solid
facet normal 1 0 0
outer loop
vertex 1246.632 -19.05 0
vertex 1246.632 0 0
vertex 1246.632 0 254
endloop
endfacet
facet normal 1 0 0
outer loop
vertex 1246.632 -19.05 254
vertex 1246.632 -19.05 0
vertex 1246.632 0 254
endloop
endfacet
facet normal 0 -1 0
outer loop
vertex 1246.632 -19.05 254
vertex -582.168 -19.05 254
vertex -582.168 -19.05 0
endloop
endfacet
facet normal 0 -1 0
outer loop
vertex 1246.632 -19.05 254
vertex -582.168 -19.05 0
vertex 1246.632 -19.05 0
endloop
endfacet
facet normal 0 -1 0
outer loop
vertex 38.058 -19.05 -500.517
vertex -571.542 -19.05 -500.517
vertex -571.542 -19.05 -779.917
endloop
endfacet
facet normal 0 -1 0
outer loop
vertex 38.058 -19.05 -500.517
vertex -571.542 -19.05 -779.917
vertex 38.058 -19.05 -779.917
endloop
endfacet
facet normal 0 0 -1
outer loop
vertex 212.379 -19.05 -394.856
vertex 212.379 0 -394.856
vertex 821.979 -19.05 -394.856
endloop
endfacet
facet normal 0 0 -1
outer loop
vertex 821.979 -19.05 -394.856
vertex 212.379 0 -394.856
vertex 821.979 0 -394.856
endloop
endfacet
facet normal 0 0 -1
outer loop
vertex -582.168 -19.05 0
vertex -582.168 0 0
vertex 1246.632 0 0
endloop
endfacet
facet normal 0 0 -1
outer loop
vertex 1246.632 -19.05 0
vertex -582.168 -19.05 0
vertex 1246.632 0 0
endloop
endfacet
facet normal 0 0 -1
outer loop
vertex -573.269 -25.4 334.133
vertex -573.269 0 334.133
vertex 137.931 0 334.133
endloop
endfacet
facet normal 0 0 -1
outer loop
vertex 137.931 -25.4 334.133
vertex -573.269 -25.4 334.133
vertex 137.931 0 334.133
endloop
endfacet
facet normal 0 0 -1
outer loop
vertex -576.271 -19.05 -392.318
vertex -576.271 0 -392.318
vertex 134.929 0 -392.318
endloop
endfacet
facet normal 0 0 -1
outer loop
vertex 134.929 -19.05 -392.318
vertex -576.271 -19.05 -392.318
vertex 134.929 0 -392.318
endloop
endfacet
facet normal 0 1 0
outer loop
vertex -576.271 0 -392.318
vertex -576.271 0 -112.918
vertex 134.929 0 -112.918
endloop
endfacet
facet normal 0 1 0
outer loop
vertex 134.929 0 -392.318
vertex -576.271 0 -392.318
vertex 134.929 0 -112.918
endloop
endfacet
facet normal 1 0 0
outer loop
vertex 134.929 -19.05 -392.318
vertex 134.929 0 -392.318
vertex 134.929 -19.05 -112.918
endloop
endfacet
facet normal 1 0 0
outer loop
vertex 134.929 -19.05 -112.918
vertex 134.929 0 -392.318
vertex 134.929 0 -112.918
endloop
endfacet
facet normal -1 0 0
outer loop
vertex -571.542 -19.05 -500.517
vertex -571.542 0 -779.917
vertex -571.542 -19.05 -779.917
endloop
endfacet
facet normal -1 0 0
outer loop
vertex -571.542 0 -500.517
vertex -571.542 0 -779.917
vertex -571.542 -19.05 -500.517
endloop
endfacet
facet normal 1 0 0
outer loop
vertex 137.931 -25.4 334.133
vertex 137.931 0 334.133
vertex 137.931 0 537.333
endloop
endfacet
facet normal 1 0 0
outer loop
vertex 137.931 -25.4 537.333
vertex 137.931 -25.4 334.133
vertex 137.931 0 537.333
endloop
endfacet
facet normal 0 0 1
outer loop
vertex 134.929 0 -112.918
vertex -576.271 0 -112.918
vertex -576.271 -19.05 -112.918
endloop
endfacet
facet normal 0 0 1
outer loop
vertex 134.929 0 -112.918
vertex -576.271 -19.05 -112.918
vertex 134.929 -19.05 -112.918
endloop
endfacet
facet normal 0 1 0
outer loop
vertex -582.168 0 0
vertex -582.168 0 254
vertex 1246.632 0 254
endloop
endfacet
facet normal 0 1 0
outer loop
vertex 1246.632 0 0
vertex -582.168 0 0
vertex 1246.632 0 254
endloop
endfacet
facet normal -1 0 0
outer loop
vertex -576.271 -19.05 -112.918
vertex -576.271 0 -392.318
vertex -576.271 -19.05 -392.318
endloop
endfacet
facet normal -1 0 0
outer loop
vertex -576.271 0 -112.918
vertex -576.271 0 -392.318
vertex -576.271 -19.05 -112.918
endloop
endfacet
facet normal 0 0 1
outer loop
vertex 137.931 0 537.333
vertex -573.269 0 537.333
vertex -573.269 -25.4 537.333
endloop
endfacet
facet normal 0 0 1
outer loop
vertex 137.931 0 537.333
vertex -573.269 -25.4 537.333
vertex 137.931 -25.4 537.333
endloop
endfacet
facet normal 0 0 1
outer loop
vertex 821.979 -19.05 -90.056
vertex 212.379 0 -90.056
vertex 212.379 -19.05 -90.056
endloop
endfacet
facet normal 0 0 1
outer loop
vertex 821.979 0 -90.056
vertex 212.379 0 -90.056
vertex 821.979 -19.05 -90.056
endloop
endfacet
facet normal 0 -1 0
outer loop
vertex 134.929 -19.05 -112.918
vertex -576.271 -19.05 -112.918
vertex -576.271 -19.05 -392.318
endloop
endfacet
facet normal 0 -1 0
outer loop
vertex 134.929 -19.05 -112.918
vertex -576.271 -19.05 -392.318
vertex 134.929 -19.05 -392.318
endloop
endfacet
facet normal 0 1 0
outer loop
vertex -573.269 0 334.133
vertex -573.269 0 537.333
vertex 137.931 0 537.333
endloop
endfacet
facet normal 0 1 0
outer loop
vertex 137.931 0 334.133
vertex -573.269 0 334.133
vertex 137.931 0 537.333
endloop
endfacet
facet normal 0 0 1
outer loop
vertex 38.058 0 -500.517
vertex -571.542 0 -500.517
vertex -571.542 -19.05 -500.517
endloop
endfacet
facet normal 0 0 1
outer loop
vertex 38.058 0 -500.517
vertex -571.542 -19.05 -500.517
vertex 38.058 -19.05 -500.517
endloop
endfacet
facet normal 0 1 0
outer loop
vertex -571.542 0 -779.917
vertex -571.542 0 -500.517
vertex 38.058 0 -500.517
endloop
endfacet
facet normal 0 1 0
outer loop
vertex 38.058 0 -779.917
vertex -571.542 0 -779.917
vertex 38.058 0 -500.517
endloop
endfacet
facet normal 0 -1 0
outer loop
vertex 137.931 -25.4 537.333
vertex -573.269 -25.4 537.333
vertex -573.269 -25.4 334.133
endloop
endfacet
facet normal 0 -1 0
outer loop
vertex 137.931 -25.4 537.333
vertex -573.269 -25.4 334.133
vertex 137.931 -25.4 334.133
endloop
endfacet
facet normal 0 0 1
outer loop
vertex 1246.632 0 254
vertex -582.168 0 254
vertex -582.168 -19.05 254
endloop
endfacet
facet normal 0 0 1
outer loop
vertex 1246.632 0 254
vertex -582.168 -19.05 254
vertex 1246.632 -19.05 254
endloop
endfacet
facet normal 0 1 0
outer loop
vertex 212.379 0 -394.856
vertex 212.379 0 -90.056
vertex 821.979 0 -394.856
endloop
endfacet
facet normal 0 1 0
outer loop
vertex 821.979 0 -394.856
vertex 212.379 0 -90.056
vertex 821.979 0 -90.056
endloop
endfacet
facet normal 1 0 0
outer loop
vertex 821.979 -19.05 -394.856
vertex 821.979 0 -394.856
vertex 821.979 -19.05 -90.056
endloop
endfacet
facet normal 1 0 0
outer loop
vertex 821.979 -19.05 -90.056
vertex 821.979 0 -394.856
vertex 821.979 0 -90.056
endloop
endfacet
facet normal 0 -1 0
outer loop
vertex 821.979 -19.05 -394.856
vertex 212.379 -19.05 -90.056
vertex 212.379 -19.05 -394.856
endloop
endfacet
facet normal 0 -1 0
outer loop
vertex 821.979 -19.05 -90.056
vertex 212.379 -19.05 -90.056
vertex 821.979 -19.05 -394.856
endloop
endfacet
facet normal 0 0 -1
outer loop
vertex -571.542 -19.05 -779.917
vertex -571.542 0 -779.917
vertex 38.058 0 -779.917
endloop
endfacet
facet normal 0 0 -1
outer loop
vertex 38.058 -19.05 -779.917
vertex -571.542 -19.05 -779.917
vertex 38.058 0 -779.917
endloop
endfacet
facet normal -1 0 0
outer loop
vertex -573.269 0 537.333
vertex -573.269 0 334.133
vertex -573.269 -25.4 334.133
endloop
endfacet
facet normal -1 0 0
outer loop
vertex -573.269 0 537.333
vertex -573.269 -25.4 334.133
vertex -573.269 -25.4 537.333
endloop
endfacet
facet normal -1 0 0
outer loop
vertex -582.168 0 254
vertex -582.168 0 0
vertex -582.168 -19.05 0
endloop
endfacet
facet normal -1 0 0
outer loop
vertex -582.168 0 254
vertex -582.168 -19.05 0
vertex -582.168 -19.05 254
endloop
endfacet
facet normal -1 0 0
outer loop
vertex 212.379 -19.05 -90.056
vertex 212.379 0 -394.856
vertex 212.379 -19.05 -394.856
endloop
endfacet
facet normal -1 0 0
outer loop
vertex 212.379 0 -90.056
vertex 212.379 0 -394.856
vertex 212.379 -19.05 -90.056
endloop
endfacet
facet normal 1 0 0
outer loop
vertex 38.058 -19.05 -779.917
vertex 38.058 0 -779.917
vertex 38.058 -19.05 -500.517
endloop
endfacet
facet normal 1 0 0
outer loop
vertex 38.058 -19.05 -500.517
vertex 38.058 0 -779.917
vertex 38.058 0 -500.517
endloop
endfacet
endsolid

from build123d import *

# Parameters (mm, degrees)
F0_W     = 1828.8
F0_H     = 254
F1_DEPTH = 19.05
F2_W     = 711.2
F2_H     = 279.4
F3_DEPTH = 19.05
F4_W     = 609.6
F4_H     = 304.8
F5_DEPTH = 19.05
F6_W     = 609.6
F6_H     = 279.4
F7_DEPTH = 19.05
F8_W     = 711.2
F8_H     = 203.2
F9_DEPTH = 25.4


with BuildPart() as f1:
    # F0 (on Front) → F1 (new body)
    with BuildSketch(Plane.XZ):
        with Locations((332.231999, 127)):
            Rectangle(F0_W, F0_H)
    extrude(amount=F1_DEPTH)


with BuildPart() as f3:
    # F2 (on Front) → F3 (new body)
    with BuildSketch(Plane.XZ):
        with Locations((-220.671342, -252.617526)):
            Rectangle(F2_W, F2_H)
    extrude(amount=F3_DEPTH)


with BuildPart() as f5:
    # F4 (on Front) → F5 (new body)
    with BuildSketch(Plane.XZ):
        with Locations((517.178617, -242.455962)):
            Rectangle(F4_W, F4_H)
    extrude(amount=F5_DEPTH)


with BuildPart() as f7:
    # F6 (on Front) → F7 (new body)
    with BuildSketch(Plane.XZ):
        with Locations((-266.742038, -640.216818)):
            Rectangle(F6_W, F6_H)
    extrude(amount=F7_DEPTH)


with BuildPart() as f9:
    # F8 (on Front) → F9 (new body)
    with BuildSketch(Plane.XZ):
        with Locations((-217.6686, 435.733072)):
            Rectangle(F8_W, F8_H)
    extrude(amount=F9_DEPTH)


solid = Compound([f1.part, f3.part, f5.part, f7.part, f9.part])
